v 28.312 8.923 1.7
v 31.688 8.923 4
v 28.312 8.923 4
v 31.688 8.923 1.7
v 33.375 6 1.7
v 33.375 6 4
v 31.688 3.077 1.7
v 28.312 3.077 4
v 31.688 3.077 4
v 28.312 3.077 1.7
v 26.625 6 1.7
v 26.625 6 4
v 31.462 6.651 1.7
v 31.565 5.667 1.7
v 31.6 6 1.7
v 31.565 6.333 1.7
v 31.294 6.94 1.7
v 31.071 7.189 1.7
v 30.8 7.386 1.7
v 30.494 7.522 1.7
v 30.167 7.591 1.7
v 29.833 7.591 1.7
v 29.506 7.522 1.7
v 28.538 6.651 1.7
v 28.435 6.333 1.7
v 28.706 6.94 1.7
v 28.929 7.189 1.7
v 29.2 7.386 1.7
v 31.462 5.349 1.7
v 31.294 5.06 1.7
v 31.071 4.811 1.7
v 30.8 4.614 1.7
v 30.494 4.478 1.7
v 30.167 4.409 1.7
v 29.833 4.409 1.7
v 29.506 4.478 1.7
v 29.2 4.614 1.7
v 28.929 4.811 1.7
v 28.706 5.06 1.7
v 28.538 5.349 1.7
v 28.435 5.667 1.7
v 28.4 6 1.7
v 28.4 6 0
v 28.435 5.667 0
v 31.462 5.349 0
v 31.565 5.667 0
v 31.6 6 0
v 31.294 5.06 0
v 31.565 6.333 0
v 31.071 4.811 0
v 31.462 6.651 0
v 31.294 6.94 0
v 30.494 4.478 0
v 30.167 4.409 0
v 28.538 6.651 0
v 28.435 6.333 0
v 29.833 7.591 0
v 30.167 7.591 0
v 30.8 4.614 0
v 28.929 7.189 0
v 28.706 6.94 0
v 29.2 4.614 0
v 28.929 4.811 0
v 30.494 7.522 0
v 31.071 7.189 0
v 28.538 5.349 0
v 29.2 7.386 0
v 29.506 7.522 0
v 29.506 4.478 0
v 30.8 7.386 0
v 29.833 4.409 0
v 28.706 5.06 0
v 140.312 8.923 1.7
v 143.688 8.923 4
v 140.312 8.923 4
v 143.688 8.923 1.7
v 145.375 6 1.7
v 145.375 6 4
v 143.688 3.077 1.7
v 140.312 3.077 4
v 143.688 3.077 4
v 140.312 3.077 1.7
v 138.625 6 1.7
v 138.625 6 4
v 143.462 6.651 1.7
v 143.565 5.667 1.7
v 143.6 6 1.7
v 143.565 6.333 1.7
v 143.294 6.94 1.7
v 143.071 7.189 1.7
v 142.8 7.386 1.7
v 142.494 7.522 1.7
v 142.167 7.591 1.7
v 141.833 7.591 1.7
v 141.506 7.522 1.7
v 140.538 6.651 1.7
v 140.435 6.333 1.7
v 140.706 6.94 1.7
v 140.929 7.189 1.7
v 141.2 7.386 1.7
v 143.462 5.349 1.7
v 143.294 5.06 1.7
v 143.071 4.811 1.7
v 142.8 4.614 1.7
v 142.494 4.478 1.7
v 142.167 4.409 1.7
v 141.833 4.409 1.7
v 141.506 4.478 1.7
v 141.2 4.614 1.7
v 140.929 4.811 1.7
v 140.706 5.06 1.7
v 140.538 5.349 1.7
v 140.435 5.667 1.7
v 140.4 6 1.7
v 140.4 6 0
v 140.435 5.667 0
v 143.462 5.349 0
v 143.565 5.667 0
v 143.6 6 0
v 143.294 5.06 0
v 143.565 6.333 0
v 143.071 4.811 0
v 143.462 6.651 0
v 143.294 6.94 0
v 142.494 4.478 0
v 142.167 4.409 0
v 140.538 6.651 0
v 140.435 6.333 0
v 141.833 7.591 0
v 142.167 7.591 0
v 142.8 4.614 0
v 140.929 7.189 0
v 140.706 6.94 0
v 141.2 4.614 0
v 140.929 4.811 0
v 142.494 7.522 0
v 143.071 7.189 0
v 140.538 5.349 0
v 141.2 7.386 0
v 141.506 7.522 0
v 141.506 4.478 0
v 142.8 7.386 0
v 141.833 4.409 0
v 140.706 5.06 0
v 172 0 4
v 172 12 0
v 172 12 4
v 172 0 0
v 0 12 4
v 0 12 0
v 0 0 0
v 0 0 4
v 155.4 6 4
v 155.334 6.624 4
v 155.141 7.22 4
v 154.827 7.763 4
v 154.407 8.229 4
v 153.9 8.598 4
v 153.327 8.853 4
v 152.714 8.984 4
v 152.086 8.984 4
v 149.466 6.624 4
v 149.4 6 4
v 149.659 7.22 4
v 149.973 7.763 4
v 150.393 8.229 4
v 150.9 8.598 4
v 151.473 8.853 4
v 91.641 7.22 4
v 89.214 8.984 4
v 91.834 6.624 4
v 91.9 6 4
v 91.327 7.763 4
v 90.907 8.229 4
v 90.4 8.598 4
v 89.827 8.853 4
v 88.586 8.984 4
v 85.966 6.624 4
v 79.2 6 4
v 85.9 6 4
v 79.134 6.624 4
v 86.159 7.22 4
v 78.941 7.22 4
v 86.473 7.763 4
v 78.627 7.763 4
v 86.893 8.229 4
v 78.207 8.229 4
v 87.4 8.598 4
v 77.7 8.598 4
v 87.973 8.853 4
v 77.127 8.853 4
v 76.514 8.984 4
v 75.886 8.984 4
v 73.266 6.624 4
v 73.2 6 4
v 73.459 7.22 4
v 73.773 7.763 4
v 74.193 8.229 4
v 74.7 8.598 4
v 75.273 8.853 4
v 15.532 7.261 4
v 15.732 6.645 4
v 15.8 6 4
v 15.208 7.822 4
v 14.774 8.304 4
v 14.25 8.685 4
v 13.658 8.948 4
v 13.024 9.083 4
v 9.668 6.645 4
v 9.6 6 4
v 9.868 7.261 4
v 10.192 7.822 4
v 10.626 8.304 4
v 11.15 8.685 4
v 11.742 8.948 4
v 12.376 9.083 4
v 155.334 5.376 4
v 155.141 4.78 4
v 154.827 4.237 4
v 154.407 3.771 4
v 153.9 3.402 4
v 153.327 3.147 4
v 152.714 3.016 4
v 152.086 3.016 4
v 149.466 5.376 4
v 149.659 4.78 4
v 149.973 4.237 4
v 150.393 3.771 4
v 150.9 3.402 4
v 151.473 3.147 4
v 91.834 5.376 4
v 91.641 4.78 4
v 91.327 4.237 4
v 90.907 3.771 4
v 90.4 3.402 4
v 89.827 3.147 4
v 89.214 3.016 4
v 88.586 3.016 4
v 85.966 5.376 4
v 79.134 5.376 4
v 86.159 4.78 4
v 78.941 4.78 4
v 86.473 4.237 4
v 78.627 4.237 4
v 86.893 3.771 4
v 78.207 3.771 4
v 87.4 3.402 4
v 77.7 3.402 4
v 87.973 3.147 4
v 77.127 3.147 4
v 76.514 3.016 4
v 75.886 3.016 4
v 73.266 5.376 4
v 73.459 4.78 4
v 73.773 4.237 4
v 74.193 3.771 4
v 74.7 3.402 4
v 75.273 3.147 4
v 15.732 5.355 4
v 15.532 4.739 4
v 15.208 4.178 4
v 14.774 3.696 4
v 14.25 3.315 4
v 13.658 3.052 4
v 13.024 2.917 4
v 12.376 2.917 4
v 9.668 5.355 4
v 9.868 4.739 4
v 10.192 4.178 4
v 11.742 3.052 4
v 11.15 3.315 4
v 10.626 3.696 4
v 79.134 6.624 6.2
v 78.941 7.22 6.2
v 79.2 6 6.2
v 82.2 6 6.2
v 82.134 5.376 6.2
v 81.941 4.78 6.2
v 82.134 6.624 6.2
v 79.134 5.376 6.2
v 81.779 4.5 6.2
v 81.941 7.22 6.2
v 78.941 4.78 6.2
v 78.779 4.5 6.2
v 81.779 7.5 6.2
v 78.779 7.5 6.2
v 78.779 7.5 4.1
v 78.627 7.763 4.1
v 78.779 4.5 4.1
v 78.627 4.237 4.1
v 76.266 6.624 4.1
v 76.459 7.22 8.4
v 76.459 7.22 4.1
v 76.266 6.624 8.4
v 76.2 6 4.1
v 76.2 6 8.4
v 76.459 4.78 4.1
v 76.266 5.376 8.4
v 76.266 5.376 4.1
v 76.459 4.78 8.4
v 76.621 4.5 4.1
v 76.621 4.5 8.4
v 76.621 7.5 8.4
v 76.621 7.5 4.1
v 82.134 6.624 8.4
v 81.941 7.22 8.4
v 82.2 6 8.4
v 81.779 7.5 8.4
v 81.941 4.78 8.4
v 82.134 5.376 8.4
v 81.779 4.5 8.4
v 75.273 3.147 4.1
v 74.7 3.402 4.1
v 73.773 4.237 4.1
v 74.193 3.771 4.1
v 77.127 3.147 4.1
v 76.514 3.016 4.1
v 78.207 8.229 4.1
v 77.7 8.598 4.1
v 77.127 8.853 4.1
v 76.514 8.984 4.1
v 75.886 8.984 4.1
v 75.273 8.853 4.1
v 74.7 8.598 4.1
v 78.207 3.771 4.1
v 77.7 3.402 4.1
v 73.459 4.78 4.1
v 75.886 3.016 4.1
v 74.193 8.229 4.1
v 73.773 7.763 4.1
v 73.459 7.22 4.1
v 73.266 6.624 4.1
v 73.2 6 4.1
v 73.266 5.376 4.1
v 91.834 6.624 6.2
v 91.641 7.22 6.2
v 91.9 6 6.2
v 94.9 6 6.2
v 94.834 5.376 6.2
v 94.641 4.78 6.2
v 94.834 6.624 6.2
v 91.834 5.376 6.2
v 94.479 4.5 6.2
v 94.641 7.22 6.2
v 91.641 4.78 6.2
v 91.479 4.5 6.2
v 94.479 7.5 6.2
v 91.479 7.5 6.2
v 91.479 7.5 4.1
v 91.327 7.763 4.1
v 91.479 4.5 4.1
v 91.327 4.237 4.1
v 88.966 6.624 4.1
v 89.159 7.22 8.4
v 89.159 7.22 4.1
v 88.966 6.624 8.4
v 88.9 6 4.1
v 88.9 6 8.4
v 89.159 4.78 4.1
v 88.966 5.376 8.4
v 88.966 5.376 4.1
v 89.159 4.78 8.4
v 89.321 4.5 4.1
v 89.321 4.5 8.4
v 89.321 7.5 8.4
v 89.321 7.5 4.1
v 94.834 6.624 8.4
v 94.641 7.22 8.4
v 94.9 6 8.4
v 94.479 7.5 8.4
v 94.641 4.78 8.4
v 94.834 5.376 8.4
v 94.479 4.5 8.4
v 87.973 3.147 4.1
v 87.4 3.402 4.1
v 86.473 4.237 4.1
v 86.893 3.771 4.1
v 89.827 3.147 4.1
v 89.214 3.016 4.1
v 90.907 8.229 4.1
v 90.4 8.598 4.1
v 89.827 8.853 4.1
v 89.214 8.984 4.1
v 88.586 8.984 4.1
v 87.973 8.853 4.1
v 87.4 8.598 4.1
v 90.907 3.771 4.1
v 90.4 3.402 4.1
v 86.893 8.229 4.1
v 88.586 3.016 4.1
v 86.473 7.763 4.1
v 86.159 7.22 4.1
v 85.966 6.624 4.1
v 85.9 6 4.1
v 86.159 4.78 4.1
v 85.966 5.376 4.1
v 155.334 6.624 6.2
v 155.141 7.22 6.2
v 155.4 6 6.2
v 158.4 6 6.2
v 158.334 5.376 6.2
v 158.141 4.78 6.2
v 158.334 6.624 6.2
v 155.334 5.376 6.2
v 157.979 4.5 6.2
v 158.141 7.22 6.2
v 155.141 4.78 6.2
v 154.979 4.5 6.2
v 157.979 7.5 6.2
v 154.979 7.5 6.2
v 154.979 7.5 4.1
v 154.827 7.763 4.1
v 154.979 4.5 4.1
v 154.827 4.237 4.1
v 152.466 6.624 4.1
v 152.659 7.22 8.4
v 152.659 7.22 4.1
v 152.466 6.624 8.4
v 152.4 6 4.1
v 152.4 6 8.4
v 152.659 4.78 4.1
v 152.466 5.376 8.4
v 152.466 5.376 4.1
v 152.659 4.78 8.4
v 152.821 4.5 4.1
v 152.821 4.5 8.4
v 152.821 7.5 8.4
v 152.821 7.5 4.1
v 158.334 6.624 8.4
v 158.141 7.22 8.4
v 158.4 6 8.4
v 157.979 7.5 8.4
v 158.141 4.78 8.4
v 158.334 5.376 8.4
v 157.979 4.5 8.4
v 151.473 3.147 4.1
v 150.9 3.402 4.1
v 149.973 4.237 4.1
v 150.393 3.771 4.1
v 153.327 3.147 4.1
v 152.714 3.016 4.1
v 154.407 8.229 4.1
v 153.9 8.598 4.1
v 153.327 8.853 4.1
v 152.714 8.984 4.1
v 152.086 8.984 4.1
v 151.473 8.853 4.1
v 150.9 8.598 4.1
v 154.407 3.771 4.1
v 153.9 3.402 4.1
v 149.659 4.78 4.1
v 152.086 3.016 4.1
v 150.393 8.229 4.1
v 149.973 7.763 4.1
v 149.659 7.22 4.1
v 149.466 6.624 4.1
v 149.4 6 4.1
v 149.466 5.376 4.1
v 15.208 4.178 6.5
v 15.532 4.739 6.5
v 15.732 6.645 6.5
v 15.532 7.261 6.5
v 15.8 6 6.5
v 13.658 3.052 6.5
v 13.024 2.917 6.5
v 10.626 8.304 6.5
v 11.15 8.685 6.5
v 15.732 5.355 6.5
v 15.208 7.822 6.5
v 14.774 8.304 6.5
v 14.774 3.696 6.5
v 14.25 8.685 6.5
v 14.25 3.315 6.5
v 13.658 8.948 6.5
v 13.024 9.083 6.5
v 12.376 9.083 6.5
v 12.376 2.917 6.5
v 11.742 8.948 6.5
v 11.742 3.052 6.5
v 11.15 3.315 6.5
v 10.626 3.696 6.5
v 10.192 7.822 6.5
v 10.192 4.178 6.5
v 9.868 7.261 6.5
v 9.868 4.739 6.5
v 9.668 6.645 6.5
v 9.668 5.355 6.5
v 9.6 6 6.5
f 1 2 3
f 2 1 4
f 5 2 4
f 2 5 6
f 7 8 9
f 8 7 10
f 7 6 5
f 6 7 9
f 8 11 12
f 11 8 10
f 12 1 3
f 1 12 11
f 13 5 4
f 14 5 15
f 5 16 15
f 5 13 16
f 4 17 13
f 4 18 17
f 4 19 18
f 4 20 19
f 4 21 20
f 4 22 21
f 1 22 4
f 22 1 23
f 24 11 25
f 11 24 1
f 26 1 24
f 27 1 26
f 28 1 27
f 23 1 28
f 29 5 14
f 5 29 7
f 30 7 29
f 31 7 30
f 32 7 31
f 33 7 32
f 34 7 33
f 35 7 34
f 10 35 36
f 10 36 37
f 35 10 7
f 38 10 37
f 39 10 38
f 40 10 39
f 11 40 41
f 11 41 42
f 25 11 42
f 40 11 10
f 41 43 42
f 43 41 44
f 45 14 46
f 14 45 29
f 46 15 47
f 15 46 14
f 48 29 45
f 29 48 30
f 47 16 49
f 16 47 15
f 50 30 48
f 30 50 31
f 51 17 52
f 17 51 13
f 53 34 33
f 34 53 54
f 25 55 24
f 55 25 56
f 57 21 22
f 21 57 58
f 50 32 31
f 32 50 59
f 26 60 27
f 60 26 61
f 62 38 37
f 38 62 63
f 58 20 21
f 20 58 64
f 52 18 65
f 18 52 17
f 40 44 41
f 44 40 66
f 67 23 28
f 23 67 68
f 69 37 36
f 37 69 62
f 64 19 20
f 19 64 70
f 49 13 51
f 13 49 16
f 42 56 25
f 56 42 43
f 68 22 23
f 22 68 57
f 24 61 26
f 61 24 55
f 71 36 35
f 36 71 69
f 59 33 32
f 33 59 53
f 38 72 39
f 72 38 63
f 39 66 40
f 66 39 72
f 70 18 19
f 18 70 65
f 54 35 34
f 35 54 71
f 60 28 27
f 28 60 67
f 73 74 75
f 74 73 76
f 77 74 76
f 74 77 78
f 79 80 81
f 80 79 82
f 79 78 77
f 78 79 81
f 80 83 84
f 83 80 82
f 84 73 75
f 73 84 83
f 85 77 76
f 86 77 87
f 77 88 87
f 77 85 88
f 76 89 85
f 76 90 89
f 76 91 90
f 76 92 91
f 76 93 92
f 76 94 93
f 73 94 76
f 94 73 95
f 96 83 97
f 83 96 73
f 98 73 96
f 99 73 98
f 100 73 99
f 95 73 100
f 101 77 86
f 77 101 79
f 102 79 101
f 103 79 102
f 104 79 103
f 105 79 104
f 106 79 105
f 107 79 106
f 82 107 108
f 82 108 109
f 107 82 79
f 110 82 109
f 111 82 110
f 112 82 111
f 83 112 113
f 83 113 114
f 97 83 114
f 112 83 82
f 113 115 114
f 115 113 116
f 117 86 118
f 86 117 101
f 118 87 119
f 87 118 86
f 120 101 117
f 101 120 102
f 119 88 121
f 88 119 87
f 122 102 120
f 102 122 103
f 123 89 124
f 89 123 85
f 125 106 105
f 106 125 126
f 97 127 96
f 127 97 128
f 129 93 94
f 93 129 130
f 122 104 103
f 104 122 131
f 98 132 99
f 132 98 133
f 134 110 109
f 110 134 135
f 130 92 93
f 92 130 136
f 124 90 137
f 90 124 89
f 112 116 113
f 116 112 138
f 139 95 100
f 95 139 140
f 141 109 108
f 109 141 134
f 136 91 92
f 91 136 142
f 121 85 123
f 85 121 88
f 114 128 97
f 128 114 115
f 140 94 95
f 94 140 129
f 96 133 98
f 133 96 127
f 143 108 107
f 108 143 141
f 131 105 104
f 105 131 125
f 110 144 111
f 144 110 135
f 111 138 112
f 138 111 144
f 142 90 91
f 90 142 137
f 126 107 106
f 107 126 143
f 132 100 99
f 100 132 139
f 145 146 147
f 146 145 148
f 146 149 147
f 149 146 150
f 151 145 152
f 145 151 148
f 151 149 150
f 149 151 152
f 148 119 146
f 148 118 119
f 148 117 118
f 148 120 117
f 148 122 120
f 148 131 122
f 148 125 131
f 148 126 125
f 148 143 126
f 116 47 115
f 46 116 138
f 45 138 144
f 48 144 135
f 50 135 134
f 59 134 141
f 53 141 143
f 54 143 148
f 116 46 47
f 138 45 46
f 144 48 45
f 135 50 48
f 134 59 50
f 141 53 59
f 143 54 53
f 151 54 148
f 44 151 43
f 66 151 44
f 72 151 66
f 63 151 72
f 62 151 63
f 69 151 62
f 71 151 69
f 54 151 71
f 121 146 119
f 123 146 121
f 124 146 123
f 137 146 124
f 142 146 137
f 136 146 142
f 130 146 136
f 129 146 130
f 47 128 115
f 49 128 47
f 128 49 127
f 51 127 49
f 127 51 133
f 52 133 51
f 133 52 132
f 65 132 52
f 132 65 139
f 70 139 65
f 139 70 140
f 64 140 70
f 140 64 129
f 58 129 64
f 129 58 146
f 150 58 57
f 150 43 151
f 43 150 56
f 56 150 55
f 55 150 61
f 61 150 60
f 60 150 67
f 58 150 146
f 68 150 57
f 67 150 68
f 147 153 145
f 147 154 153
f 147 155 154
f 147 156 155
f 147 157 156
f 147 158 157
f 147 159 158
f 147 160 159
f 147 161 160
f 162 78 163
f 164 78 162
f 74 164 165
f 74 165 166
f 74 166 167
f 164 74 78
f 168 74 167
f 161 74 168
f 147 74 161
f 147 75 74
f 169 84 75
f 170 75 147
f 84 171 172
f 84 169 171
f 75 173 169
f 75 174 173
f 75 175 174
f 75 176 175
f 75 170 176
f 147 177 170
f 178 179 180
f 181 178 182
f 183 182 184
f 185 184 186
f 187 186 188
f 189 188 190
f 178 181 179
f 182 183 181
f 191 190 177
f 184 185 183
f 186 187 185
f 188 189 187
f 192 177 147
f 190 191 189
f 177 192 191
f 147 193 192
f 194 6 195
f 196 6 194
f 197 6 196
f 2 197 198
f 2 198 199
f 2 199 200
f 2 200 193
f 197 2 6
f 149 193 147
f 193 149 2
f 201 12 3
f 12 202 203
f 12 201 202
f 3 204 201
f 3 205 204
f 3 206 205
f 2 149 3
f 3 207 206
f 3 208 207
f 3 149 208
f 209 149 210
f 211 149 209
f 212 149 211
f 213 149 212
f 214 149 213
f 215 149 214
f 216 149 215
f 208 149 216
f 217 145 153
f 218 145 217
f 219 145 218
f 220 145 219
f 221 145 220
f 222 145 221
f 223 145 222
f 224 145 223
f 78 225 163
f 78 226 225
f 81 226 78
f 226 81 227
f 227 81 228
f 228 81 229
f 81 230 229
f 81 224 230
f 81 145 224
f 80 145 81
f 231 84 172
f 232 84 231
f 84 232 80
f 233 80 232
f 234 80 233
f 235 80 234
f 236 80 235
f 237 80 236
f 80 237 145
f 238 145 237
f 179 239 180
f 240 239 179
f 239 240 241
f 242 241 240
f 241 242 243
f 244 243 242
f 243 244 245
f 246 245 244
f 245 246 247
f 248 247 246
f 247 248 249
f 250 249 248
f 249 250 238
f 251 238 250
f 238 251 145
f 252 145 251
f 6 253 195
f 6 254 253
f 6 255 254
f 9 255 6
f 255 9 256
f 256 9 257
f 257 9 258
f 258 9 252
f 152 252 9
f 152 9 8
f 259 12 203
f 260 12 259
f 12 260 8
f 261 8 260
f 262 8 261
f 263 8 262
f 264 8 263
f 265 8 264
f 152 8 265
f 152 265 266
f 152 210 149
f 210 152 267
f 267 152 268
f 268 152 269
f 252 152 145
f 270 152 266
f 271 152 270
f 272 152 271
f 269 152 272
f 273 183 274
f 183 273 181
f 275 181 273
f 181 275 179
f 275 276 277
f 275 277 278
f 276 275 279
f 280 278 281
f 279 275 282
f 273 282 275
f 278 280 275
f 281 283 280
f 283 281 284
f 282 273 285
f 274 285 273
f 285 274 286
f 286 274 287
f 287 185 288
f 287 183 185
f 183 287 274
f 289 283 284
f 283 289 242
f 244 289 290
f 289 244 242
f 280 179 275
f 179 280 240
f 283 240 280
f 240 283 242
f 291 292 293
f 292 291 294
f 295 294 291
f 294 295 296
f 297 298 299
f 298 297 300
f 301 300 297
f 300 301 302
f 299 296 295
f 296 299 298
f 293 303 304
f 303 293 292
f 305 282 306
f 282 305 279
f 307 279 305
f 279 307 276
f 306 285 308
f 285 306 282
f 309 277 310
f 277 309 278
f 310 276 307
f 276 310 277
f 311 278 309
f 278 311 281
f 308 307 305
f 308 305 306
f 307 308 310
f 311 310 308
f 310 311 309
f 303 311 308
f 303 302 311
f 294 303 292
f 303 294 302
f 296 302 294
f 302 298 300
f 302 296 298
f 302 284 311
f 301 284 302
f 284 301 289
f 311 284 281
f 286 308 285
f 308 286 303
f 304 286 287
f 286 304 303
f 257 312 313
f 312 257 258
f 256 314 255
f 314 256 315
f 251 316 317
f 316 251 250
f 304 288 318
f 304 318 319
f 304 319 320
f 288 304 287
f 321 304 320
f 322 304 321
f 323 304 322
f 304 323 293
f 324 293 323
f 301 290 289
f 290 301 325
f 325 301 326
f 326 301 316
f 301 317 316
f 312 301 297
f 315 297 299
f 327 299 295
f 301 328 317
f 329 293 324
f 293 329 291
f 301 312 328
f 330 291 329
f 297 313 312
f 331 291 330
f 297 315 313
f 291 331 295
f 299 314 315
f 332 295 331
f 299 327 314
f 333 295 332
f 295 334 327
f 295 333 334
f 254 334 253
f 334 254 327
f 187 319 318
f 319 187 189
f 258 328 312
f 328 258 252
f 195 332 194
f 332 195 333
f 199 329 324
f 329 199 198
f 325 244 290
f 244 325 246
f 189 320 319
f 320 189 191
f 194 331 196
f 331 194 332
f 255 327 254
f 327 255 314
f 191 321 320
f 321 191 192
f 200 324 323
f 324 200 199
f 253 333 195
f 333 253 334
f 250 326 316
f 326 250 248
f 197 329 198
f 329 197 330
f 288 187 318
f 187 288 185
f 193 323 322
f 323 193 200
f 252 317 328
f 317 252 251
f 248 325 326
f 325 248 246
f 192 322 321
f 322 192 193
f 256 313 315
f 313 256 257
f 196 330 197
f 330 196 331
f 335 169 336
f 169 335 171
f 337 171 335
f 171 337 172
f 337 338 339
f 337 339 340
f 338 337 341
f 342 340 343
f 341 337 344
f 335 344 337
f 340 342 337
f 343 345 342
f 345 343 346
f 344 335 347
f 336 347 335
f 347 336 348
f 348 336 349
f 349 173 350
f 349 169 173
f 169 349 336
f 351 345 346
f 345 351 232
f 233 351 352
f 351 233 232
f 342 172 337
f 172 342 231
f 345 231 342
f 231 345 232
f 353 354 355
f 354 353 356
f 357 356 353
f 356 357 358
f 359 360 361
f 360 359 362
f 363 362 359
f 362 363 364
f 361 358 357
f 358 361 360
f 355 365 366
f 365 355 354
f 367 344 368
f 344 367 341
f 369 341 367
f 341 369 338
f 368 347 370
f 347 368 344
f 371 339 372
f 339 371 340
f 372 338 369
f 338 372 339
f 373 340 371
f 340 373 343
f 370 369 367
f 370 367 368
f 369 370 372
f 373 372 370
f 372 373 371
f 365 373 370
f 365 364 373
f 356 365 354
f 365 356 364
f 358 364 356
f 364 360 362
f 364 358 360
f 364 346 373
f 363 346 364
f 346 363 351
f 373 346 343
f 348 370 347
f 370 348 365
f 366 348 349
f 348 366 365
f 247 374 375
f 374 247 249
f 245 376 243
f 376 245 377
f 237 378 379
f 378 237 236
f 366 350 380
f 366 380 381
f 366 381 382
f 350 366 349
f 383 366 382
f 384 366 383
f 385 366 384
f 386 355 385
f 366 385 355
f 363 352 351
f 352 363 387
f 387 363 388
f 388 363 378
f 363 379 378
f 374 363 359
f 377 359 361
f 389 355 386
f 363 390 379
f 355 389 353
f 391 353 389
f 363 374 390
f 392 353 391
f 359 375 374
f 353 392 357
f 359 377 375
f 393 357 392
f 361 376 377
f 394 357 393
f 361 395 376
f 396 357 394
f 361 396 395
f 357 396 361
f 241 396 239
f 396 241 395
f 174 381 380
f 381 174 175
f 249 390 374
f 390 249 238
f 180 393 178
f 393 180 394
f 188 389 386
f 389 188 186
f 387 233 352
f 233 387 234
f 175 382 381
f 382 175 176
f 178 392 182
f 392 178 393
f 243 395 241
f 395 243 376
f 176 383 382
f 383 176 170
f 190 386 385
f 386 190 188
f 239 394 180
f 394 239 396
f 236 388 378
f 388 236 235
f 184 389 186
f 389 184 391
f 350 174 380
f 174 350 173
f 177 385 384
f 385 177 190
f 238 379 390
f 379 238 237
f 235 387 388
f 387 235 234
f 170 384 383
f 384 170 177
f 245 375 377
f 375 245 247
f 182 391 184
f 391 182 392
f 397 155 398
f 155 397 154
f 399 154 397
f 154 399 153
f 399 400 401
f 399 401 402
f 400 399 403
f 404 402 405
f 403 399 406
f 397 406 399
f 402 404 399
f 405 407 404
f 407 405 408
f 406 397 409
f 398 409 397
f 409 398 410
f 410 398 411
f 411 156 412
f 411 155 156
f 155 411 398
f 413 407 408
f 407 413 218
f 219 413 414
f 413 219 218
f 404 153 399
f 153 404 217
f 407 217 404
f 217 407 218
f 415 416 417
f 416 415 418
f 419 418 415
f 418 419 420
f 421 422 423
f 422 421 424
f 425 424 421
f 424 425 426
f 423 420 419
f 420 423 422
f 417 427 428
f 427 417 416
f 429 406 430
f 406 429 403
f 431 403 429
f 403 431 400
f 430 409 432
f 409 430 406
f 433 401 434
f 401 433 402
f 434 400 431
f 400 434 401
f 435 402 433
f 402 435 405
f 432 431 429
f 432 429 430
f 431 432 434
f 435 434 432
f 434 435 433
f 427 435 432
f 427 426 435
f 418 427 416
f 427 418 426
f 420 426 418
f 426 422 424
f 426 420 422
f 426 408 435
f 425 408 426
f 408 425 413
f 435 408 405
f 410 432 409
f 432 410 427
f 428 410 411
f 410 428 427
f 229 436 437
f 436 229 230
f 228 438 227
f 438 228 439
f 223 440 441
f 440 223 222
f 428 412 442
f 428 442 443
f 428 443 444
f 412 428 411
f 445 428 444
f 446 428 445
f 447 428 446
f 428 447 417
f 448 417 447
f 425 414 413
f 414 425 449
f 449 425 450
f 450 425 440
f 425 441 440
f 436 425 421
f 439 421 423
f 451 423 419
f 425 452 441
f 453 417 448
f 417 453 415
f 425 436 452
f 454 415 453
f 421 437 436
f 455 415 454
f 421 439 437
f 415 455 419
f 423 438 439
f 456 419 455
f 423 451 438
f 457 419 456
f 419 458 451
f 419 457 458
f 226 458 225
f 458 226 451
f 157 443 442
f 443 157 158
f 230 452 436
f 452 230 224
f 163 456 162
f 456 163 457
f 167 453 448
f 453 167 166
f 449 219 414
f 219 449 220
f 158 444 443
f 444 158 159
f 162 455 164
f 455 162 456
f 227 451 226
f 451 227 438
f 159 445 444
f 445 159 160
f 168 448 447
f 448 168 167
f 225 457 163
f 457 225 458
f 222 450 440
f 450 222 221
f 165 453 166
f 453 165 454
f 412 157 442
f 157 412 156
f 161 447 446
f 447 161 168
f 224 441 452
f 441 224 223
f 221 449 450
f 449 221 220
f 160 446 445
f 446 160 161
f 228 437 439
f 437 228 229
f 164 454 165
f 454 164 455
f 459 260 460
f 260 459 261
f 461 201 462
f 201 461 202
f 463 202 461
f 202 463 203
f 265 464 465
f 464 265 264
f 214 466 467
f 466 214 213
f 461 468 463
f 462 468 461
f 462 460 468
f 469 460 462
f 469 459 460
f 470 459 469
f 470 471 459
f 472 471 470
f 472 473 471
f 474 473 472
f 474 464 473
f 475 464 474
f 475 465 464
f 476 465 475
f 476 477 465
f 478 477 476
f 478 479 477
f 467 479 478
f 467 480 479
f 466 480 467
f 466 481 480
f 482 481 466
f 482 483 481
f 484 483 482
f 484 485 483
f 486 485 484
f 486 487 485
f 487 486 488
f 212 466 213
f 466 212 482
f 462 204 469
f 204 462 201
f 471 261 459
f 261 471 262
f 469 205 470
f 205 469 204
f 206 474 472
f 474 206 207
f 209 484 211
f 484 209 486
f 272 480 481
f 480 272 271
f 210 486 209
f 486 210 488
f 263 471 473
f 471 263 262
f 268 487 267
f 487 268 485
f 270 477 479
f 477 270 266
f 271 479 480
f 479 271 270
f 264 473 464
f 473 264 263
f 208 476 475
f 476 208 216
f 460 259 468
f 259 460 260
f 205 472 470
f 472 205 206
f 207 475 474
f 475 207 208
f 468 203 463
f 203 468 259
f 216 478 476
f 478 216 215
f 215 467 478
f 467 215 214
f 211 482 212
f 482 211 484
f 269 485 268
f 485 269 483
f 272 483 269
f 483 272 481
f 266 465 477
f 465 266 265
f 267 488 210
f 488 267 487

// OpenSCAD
$fs = 0.1;

module clip() {
	size = 6;
	
	scale([1, 2.2/3, 1]) intersection() {
		translate([0, -size, 0]) linear_extrude(size/2, center=true) polygon(points=[
			[0, 0], [size, 0], 
			[size, size/2], [size/2, size/2],
			[size/2, size], [0, size]
		]);
		
		union() {
			intersection() {
				rotate(90, [1, 0, 0]) cylinder(d=size,h=size/2);
				translate([size/2, 0, 0]) rotate(90, [1, 0, 0])  cylinder(h=size,d=size);
			}
			
			translate([size/2, -size/2, 0]) rotate(90, [1, 0, 0])  cylinder(h=size/2,d=size);
		}
	}
	
	rotate(90, [1, 0, 0]) cylinder(d=size,h=0.1);
}

module hex_hole(nut_radius, screw_radius, depth) {
	correction = 1/cos(30);
	cylinder(r=nut_radius*correction+0.2, h=2.4, $fa=60);
	cylinder(d=screw_radius,h=depth);
}

height = 12;
thickness = 4;
hole_width = 12.7;
distance = 112;
width = distance+60;
offset = (width-distance) / 2;

translate([0, 0, thickness]) rotate(90, [-1, 0, 0]) union() {
	color("orange") translate([hole_width*1, 0, height/2]) rotate(90, [1, 0, 0]) cylinder(d=6.2,h=2.5);
	
	color("blue") difference() {
		cube(size=[width, thickness, height]);
		
		// Screw holes
		translate([offset, 0, height/2]) rotate(90, [-1, 0, 0]) {
			translate([0, 0, -0.1]) hex_hole(5.5/2, 3.2, thickness+0.2);
			translate([distance, 0, -0.1]) hex_hole(5.5/2, 3.2, thickness+0.2);
		}
	}
	
	color("green") union() {
		translate([hole_width*6, 0, height/2]) clip();
		translate([hole_width*7, 0, height/2]) clip();
		
		translate([hole_width*12, 0, height/2]) clip();
	}
}
